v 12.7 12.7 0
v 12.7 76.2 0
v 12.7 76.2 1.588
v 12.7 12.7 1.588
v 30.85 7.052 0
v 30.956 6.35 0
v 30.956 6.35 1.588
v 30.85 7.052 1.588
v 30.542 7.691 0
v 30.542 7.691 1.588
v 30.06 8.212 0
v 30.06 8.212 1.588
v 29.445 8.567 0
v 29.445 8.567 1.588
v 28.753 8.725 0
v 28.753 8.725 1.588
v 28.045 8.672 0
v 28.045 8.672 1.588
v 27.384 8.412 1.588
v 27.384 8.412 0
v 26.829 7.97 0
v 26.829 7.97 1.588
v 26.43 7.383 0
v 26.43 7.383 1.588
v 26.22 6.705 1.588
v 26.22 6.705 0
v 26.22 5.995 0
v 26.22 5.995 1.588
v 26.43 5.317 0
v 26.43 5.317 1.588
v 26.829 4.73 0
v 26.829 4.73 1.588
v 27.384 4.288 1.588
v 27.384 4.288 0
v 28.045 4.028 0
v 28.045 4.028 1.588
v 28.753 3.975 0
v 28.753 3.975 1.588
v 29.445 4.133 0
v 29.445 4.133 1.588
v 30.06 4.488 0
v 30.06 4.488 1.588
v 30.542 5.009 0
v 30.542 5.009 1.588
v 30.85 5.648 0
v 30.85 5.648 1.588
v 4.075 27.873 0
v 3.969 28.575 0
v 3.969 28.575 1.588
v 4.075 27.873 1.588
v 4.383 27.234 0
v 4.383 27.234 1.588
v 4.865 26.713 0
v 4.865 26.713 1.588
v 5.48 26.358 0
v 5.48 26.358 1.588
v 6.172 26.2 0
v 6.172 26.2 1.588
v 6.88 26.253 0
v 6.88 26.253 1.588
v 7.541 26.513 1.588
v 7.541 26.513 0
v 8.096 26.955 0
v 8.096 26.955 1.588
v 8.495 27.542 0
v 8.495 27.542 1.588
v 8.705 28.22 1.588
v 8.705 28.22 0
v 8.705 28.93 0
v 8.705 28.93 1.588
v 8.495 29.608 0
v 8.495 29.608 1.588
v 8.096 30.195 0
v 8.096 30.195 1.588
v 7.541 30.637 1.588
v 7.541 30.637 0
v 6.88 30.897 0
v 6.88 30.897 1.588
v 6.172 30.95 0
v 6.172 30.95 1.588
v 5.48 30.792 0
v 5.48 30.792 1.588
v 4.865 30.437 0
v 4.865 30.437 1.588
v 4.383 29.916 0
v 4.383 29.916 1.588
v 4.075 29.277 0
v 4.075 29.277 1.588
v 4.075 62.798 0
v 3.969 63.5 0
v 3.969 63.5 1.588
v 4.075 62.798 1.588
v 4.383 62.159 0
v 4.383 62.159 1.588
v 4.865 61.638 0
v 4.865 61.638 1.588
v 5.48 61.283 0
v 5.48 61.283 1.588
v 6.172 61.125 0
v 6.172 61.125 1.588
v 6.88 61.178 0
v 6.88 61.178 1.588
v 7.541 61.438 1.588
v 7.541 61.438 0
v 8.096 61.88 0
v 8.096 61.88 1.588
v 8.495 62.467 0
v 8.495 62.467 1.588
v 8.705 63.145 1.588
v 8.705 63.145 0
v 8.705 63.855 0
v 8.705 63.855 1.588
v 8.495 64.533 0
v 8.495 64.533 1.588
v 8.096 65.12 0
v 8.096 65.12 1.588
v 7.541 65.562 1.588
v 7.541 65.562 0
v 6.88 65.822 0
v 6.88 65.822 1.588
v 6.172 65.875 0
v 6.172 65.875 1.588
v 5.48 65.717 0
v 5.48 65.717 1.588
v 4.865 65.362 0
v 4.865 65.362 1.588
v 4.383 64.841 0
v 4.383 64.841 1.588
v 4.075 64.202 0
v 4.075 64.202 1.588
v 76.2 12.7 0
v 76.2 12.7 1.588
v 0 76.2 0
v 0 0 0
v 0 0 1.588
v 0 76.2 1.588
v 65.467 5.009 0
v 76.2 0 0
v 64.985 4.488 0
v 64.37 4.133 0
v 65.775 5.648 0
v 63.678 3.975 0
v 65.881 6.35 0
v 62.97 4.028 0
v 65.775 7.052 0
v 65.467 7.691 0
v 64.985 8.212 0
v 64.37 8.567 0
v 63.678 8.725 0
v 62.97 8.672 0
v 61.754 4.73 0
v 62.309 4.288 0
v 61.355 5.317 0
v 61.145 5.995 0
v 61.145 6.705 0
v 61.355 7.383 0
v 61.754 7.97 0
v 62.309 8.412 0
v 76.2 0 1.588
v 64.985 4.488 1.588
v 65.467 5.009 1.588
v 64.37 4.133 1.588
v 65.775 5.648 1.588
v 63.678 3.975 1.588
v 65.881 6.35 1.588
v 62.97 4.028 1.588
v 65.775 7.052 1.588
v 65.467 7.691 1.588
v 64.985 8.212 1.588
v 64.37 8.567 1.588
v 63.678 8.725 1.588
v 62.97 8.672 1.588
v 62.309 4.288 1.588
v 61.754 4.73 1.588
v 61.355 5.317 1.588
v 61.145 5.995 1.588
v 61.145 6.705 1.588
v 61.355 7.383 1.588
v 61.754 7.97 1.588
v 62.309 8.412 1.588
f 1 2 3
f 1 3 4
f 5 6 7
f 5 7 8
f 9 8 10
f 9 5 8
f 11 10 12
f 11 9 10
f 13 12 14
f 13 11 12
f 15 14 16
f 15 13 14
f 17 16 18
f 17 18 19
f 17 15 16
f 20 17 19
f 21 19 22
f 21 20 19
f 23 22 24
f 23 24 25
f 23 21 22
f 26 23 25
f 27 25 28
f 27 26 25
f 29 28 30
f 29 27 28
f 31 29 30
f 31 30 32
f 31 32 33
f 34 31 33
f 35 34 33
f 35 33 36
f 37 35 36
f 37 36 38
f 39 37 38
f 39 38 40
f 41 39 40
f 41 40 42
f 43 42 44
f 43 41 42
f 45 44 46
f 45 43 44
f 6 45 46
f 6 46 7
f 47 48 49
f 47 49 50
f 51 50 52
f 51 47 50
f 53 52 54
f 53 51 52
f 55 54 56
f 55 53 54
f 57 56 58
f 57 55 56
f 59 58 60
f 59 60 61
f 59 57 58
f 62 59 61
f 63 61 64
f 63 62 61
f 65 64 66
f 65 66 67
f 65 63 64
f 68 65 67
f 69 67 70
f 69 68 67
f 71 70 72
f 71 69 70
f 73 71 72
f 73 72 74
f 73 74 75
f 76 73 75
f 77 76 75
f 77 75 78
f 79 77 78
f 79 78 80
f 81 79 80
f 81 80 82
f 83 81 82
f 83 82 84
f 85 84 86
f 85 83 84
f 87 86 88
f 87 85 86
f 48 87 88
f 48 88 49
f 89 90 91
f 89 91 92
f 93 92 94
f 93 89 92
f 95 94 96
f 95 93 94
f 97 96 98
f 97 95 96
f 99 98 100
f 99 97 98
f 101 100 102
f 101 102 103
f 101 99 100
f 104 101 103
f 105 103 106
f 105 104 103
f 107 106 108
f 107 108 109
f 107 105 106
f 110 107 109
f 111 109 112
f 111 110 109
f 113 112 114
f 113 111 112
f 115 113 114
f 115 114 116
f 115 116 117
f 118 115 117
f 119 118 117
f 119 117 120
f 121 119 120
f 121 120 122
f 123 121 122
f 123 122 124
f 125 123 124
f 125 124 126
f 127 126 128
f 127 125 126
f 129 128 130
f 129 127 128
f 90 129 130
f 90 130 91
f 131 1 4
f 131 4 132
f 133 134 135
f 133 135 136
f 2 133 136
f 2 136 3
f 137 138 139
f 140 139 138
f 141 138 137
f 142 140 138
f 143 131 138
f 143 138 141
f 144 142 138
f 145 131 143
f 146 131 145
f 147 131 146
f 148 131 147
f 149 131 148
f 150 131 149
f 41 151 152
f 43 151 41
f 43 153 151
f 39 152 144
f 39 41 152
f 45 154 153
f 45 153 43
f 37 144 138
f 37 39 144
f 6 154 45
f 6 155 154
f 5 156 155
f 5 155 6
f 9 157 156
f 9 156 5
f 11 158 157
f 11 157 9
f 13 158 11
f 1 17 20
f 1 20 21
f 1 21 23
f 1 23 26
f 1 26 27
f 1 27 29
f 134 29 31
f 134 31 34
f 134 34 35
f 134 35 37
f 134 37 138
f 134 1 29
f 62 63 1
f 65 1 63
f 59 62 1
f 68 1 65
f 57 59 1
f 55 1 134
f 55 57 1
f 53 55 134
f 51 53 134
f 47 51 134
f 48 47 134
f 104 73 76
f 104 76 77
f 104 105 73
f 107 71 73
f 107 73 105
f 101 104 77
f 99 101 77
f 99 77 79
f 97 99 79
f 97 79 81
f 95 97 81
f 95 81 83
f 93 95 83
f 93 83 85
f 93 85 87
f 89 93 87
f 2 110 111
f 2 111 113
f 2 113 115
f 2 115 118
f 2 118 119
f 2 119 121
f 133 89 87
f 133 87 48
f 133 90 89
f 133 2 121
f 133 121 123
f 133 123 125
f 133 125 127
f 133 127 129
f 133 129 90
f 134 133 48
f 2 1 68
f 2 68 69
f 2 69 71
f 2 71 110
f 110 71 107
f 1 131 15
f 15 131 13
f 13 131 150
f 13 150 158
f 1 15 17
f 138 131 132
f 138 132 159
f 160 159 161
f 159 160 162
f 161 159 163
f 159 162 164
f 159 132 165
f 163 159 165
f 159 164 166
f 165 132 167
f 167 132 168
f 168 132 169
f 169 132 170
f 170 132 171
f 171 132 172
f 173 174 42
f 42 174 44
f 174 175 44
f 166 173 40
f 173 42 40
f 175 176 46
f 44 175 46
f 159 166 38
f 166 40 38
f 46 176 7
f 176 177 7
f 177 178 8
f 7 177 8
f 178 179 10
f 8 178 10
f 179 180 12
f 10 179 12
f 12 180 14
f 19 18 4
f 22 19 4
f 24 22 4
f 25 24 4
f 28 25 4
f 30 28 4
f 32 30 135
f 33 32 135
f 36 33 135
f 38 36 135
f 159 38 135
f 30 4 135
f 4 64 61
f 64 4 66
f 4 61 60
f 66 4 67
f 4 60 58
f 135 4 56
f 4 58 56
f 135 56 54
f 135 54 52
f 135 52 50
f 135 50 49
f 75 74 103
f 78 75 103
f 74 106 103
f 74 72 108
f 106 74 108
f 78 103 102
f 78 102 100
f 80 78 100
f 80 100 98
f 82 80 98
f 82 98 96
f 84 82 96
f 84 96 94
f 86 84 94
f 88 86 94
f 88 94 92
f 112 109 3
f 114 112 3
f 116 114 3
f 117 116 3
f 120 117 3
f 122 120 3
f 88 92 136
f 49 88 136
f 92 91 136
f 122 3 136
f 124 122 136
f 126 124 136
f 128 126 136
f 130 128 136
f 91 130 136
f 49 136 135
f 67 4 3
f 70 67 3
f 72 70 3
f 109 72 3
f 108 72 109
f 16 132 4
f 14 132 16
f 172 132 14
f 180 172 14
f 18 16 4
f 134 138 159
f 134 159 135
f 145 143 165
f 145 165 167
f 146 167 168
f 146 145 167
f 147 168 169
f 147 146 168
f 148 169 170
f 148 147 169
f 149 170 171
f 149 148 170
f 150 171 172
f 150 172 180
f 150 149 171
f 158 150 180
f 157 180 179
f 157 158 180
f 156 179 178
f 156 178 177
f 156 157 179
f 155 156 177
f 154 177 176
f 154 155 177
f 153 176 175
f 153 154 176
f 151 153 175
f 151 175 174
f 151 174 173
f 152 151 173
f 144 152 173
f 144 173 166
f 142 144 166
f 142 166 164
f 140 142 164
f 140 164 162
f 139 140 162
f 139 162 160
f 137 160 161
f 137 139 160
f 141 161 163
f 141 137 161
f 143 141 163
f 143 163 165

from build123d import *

# Parameters (mm, degrees)
SKETCH1_R           = 2.38125
BOSS_EXTRUDE1_DEPTH = 1.5875


with BuildPart() as part:
    # Sketch1 → Boss-Extrude1 (new body)
    with BuildSketch(Plane.XY):
        Polygon((0, 0), (0, 76.2), (12.7, 76.2), (12.7, 12.7), (76.2, 12.7), (76.2, 0), align=None)
        with Locations((63.5, 6.35)):
            Circle(SKETCH1_R, mode=Mode.SUBTRACT)
        with Locations((28.575, 6.35)):
            Circle(SKETCH1_R, mode=Mode.SUBTRACT)
        with Locations(Location((6.35, 63.5, 0), (0, 0, 180))):
            Circle(SKETCH1_R, mode=Mode.SUBTRACT)
        with Locations(Location((6.35, 28.575, 0), (0, 0, 180))):
            Circle(SKETCH1_R, mode=Mode.SUBTRACT)
    extrude(amount=BOSS_EXTRUDE1_DEPTH)


solid = part.part
